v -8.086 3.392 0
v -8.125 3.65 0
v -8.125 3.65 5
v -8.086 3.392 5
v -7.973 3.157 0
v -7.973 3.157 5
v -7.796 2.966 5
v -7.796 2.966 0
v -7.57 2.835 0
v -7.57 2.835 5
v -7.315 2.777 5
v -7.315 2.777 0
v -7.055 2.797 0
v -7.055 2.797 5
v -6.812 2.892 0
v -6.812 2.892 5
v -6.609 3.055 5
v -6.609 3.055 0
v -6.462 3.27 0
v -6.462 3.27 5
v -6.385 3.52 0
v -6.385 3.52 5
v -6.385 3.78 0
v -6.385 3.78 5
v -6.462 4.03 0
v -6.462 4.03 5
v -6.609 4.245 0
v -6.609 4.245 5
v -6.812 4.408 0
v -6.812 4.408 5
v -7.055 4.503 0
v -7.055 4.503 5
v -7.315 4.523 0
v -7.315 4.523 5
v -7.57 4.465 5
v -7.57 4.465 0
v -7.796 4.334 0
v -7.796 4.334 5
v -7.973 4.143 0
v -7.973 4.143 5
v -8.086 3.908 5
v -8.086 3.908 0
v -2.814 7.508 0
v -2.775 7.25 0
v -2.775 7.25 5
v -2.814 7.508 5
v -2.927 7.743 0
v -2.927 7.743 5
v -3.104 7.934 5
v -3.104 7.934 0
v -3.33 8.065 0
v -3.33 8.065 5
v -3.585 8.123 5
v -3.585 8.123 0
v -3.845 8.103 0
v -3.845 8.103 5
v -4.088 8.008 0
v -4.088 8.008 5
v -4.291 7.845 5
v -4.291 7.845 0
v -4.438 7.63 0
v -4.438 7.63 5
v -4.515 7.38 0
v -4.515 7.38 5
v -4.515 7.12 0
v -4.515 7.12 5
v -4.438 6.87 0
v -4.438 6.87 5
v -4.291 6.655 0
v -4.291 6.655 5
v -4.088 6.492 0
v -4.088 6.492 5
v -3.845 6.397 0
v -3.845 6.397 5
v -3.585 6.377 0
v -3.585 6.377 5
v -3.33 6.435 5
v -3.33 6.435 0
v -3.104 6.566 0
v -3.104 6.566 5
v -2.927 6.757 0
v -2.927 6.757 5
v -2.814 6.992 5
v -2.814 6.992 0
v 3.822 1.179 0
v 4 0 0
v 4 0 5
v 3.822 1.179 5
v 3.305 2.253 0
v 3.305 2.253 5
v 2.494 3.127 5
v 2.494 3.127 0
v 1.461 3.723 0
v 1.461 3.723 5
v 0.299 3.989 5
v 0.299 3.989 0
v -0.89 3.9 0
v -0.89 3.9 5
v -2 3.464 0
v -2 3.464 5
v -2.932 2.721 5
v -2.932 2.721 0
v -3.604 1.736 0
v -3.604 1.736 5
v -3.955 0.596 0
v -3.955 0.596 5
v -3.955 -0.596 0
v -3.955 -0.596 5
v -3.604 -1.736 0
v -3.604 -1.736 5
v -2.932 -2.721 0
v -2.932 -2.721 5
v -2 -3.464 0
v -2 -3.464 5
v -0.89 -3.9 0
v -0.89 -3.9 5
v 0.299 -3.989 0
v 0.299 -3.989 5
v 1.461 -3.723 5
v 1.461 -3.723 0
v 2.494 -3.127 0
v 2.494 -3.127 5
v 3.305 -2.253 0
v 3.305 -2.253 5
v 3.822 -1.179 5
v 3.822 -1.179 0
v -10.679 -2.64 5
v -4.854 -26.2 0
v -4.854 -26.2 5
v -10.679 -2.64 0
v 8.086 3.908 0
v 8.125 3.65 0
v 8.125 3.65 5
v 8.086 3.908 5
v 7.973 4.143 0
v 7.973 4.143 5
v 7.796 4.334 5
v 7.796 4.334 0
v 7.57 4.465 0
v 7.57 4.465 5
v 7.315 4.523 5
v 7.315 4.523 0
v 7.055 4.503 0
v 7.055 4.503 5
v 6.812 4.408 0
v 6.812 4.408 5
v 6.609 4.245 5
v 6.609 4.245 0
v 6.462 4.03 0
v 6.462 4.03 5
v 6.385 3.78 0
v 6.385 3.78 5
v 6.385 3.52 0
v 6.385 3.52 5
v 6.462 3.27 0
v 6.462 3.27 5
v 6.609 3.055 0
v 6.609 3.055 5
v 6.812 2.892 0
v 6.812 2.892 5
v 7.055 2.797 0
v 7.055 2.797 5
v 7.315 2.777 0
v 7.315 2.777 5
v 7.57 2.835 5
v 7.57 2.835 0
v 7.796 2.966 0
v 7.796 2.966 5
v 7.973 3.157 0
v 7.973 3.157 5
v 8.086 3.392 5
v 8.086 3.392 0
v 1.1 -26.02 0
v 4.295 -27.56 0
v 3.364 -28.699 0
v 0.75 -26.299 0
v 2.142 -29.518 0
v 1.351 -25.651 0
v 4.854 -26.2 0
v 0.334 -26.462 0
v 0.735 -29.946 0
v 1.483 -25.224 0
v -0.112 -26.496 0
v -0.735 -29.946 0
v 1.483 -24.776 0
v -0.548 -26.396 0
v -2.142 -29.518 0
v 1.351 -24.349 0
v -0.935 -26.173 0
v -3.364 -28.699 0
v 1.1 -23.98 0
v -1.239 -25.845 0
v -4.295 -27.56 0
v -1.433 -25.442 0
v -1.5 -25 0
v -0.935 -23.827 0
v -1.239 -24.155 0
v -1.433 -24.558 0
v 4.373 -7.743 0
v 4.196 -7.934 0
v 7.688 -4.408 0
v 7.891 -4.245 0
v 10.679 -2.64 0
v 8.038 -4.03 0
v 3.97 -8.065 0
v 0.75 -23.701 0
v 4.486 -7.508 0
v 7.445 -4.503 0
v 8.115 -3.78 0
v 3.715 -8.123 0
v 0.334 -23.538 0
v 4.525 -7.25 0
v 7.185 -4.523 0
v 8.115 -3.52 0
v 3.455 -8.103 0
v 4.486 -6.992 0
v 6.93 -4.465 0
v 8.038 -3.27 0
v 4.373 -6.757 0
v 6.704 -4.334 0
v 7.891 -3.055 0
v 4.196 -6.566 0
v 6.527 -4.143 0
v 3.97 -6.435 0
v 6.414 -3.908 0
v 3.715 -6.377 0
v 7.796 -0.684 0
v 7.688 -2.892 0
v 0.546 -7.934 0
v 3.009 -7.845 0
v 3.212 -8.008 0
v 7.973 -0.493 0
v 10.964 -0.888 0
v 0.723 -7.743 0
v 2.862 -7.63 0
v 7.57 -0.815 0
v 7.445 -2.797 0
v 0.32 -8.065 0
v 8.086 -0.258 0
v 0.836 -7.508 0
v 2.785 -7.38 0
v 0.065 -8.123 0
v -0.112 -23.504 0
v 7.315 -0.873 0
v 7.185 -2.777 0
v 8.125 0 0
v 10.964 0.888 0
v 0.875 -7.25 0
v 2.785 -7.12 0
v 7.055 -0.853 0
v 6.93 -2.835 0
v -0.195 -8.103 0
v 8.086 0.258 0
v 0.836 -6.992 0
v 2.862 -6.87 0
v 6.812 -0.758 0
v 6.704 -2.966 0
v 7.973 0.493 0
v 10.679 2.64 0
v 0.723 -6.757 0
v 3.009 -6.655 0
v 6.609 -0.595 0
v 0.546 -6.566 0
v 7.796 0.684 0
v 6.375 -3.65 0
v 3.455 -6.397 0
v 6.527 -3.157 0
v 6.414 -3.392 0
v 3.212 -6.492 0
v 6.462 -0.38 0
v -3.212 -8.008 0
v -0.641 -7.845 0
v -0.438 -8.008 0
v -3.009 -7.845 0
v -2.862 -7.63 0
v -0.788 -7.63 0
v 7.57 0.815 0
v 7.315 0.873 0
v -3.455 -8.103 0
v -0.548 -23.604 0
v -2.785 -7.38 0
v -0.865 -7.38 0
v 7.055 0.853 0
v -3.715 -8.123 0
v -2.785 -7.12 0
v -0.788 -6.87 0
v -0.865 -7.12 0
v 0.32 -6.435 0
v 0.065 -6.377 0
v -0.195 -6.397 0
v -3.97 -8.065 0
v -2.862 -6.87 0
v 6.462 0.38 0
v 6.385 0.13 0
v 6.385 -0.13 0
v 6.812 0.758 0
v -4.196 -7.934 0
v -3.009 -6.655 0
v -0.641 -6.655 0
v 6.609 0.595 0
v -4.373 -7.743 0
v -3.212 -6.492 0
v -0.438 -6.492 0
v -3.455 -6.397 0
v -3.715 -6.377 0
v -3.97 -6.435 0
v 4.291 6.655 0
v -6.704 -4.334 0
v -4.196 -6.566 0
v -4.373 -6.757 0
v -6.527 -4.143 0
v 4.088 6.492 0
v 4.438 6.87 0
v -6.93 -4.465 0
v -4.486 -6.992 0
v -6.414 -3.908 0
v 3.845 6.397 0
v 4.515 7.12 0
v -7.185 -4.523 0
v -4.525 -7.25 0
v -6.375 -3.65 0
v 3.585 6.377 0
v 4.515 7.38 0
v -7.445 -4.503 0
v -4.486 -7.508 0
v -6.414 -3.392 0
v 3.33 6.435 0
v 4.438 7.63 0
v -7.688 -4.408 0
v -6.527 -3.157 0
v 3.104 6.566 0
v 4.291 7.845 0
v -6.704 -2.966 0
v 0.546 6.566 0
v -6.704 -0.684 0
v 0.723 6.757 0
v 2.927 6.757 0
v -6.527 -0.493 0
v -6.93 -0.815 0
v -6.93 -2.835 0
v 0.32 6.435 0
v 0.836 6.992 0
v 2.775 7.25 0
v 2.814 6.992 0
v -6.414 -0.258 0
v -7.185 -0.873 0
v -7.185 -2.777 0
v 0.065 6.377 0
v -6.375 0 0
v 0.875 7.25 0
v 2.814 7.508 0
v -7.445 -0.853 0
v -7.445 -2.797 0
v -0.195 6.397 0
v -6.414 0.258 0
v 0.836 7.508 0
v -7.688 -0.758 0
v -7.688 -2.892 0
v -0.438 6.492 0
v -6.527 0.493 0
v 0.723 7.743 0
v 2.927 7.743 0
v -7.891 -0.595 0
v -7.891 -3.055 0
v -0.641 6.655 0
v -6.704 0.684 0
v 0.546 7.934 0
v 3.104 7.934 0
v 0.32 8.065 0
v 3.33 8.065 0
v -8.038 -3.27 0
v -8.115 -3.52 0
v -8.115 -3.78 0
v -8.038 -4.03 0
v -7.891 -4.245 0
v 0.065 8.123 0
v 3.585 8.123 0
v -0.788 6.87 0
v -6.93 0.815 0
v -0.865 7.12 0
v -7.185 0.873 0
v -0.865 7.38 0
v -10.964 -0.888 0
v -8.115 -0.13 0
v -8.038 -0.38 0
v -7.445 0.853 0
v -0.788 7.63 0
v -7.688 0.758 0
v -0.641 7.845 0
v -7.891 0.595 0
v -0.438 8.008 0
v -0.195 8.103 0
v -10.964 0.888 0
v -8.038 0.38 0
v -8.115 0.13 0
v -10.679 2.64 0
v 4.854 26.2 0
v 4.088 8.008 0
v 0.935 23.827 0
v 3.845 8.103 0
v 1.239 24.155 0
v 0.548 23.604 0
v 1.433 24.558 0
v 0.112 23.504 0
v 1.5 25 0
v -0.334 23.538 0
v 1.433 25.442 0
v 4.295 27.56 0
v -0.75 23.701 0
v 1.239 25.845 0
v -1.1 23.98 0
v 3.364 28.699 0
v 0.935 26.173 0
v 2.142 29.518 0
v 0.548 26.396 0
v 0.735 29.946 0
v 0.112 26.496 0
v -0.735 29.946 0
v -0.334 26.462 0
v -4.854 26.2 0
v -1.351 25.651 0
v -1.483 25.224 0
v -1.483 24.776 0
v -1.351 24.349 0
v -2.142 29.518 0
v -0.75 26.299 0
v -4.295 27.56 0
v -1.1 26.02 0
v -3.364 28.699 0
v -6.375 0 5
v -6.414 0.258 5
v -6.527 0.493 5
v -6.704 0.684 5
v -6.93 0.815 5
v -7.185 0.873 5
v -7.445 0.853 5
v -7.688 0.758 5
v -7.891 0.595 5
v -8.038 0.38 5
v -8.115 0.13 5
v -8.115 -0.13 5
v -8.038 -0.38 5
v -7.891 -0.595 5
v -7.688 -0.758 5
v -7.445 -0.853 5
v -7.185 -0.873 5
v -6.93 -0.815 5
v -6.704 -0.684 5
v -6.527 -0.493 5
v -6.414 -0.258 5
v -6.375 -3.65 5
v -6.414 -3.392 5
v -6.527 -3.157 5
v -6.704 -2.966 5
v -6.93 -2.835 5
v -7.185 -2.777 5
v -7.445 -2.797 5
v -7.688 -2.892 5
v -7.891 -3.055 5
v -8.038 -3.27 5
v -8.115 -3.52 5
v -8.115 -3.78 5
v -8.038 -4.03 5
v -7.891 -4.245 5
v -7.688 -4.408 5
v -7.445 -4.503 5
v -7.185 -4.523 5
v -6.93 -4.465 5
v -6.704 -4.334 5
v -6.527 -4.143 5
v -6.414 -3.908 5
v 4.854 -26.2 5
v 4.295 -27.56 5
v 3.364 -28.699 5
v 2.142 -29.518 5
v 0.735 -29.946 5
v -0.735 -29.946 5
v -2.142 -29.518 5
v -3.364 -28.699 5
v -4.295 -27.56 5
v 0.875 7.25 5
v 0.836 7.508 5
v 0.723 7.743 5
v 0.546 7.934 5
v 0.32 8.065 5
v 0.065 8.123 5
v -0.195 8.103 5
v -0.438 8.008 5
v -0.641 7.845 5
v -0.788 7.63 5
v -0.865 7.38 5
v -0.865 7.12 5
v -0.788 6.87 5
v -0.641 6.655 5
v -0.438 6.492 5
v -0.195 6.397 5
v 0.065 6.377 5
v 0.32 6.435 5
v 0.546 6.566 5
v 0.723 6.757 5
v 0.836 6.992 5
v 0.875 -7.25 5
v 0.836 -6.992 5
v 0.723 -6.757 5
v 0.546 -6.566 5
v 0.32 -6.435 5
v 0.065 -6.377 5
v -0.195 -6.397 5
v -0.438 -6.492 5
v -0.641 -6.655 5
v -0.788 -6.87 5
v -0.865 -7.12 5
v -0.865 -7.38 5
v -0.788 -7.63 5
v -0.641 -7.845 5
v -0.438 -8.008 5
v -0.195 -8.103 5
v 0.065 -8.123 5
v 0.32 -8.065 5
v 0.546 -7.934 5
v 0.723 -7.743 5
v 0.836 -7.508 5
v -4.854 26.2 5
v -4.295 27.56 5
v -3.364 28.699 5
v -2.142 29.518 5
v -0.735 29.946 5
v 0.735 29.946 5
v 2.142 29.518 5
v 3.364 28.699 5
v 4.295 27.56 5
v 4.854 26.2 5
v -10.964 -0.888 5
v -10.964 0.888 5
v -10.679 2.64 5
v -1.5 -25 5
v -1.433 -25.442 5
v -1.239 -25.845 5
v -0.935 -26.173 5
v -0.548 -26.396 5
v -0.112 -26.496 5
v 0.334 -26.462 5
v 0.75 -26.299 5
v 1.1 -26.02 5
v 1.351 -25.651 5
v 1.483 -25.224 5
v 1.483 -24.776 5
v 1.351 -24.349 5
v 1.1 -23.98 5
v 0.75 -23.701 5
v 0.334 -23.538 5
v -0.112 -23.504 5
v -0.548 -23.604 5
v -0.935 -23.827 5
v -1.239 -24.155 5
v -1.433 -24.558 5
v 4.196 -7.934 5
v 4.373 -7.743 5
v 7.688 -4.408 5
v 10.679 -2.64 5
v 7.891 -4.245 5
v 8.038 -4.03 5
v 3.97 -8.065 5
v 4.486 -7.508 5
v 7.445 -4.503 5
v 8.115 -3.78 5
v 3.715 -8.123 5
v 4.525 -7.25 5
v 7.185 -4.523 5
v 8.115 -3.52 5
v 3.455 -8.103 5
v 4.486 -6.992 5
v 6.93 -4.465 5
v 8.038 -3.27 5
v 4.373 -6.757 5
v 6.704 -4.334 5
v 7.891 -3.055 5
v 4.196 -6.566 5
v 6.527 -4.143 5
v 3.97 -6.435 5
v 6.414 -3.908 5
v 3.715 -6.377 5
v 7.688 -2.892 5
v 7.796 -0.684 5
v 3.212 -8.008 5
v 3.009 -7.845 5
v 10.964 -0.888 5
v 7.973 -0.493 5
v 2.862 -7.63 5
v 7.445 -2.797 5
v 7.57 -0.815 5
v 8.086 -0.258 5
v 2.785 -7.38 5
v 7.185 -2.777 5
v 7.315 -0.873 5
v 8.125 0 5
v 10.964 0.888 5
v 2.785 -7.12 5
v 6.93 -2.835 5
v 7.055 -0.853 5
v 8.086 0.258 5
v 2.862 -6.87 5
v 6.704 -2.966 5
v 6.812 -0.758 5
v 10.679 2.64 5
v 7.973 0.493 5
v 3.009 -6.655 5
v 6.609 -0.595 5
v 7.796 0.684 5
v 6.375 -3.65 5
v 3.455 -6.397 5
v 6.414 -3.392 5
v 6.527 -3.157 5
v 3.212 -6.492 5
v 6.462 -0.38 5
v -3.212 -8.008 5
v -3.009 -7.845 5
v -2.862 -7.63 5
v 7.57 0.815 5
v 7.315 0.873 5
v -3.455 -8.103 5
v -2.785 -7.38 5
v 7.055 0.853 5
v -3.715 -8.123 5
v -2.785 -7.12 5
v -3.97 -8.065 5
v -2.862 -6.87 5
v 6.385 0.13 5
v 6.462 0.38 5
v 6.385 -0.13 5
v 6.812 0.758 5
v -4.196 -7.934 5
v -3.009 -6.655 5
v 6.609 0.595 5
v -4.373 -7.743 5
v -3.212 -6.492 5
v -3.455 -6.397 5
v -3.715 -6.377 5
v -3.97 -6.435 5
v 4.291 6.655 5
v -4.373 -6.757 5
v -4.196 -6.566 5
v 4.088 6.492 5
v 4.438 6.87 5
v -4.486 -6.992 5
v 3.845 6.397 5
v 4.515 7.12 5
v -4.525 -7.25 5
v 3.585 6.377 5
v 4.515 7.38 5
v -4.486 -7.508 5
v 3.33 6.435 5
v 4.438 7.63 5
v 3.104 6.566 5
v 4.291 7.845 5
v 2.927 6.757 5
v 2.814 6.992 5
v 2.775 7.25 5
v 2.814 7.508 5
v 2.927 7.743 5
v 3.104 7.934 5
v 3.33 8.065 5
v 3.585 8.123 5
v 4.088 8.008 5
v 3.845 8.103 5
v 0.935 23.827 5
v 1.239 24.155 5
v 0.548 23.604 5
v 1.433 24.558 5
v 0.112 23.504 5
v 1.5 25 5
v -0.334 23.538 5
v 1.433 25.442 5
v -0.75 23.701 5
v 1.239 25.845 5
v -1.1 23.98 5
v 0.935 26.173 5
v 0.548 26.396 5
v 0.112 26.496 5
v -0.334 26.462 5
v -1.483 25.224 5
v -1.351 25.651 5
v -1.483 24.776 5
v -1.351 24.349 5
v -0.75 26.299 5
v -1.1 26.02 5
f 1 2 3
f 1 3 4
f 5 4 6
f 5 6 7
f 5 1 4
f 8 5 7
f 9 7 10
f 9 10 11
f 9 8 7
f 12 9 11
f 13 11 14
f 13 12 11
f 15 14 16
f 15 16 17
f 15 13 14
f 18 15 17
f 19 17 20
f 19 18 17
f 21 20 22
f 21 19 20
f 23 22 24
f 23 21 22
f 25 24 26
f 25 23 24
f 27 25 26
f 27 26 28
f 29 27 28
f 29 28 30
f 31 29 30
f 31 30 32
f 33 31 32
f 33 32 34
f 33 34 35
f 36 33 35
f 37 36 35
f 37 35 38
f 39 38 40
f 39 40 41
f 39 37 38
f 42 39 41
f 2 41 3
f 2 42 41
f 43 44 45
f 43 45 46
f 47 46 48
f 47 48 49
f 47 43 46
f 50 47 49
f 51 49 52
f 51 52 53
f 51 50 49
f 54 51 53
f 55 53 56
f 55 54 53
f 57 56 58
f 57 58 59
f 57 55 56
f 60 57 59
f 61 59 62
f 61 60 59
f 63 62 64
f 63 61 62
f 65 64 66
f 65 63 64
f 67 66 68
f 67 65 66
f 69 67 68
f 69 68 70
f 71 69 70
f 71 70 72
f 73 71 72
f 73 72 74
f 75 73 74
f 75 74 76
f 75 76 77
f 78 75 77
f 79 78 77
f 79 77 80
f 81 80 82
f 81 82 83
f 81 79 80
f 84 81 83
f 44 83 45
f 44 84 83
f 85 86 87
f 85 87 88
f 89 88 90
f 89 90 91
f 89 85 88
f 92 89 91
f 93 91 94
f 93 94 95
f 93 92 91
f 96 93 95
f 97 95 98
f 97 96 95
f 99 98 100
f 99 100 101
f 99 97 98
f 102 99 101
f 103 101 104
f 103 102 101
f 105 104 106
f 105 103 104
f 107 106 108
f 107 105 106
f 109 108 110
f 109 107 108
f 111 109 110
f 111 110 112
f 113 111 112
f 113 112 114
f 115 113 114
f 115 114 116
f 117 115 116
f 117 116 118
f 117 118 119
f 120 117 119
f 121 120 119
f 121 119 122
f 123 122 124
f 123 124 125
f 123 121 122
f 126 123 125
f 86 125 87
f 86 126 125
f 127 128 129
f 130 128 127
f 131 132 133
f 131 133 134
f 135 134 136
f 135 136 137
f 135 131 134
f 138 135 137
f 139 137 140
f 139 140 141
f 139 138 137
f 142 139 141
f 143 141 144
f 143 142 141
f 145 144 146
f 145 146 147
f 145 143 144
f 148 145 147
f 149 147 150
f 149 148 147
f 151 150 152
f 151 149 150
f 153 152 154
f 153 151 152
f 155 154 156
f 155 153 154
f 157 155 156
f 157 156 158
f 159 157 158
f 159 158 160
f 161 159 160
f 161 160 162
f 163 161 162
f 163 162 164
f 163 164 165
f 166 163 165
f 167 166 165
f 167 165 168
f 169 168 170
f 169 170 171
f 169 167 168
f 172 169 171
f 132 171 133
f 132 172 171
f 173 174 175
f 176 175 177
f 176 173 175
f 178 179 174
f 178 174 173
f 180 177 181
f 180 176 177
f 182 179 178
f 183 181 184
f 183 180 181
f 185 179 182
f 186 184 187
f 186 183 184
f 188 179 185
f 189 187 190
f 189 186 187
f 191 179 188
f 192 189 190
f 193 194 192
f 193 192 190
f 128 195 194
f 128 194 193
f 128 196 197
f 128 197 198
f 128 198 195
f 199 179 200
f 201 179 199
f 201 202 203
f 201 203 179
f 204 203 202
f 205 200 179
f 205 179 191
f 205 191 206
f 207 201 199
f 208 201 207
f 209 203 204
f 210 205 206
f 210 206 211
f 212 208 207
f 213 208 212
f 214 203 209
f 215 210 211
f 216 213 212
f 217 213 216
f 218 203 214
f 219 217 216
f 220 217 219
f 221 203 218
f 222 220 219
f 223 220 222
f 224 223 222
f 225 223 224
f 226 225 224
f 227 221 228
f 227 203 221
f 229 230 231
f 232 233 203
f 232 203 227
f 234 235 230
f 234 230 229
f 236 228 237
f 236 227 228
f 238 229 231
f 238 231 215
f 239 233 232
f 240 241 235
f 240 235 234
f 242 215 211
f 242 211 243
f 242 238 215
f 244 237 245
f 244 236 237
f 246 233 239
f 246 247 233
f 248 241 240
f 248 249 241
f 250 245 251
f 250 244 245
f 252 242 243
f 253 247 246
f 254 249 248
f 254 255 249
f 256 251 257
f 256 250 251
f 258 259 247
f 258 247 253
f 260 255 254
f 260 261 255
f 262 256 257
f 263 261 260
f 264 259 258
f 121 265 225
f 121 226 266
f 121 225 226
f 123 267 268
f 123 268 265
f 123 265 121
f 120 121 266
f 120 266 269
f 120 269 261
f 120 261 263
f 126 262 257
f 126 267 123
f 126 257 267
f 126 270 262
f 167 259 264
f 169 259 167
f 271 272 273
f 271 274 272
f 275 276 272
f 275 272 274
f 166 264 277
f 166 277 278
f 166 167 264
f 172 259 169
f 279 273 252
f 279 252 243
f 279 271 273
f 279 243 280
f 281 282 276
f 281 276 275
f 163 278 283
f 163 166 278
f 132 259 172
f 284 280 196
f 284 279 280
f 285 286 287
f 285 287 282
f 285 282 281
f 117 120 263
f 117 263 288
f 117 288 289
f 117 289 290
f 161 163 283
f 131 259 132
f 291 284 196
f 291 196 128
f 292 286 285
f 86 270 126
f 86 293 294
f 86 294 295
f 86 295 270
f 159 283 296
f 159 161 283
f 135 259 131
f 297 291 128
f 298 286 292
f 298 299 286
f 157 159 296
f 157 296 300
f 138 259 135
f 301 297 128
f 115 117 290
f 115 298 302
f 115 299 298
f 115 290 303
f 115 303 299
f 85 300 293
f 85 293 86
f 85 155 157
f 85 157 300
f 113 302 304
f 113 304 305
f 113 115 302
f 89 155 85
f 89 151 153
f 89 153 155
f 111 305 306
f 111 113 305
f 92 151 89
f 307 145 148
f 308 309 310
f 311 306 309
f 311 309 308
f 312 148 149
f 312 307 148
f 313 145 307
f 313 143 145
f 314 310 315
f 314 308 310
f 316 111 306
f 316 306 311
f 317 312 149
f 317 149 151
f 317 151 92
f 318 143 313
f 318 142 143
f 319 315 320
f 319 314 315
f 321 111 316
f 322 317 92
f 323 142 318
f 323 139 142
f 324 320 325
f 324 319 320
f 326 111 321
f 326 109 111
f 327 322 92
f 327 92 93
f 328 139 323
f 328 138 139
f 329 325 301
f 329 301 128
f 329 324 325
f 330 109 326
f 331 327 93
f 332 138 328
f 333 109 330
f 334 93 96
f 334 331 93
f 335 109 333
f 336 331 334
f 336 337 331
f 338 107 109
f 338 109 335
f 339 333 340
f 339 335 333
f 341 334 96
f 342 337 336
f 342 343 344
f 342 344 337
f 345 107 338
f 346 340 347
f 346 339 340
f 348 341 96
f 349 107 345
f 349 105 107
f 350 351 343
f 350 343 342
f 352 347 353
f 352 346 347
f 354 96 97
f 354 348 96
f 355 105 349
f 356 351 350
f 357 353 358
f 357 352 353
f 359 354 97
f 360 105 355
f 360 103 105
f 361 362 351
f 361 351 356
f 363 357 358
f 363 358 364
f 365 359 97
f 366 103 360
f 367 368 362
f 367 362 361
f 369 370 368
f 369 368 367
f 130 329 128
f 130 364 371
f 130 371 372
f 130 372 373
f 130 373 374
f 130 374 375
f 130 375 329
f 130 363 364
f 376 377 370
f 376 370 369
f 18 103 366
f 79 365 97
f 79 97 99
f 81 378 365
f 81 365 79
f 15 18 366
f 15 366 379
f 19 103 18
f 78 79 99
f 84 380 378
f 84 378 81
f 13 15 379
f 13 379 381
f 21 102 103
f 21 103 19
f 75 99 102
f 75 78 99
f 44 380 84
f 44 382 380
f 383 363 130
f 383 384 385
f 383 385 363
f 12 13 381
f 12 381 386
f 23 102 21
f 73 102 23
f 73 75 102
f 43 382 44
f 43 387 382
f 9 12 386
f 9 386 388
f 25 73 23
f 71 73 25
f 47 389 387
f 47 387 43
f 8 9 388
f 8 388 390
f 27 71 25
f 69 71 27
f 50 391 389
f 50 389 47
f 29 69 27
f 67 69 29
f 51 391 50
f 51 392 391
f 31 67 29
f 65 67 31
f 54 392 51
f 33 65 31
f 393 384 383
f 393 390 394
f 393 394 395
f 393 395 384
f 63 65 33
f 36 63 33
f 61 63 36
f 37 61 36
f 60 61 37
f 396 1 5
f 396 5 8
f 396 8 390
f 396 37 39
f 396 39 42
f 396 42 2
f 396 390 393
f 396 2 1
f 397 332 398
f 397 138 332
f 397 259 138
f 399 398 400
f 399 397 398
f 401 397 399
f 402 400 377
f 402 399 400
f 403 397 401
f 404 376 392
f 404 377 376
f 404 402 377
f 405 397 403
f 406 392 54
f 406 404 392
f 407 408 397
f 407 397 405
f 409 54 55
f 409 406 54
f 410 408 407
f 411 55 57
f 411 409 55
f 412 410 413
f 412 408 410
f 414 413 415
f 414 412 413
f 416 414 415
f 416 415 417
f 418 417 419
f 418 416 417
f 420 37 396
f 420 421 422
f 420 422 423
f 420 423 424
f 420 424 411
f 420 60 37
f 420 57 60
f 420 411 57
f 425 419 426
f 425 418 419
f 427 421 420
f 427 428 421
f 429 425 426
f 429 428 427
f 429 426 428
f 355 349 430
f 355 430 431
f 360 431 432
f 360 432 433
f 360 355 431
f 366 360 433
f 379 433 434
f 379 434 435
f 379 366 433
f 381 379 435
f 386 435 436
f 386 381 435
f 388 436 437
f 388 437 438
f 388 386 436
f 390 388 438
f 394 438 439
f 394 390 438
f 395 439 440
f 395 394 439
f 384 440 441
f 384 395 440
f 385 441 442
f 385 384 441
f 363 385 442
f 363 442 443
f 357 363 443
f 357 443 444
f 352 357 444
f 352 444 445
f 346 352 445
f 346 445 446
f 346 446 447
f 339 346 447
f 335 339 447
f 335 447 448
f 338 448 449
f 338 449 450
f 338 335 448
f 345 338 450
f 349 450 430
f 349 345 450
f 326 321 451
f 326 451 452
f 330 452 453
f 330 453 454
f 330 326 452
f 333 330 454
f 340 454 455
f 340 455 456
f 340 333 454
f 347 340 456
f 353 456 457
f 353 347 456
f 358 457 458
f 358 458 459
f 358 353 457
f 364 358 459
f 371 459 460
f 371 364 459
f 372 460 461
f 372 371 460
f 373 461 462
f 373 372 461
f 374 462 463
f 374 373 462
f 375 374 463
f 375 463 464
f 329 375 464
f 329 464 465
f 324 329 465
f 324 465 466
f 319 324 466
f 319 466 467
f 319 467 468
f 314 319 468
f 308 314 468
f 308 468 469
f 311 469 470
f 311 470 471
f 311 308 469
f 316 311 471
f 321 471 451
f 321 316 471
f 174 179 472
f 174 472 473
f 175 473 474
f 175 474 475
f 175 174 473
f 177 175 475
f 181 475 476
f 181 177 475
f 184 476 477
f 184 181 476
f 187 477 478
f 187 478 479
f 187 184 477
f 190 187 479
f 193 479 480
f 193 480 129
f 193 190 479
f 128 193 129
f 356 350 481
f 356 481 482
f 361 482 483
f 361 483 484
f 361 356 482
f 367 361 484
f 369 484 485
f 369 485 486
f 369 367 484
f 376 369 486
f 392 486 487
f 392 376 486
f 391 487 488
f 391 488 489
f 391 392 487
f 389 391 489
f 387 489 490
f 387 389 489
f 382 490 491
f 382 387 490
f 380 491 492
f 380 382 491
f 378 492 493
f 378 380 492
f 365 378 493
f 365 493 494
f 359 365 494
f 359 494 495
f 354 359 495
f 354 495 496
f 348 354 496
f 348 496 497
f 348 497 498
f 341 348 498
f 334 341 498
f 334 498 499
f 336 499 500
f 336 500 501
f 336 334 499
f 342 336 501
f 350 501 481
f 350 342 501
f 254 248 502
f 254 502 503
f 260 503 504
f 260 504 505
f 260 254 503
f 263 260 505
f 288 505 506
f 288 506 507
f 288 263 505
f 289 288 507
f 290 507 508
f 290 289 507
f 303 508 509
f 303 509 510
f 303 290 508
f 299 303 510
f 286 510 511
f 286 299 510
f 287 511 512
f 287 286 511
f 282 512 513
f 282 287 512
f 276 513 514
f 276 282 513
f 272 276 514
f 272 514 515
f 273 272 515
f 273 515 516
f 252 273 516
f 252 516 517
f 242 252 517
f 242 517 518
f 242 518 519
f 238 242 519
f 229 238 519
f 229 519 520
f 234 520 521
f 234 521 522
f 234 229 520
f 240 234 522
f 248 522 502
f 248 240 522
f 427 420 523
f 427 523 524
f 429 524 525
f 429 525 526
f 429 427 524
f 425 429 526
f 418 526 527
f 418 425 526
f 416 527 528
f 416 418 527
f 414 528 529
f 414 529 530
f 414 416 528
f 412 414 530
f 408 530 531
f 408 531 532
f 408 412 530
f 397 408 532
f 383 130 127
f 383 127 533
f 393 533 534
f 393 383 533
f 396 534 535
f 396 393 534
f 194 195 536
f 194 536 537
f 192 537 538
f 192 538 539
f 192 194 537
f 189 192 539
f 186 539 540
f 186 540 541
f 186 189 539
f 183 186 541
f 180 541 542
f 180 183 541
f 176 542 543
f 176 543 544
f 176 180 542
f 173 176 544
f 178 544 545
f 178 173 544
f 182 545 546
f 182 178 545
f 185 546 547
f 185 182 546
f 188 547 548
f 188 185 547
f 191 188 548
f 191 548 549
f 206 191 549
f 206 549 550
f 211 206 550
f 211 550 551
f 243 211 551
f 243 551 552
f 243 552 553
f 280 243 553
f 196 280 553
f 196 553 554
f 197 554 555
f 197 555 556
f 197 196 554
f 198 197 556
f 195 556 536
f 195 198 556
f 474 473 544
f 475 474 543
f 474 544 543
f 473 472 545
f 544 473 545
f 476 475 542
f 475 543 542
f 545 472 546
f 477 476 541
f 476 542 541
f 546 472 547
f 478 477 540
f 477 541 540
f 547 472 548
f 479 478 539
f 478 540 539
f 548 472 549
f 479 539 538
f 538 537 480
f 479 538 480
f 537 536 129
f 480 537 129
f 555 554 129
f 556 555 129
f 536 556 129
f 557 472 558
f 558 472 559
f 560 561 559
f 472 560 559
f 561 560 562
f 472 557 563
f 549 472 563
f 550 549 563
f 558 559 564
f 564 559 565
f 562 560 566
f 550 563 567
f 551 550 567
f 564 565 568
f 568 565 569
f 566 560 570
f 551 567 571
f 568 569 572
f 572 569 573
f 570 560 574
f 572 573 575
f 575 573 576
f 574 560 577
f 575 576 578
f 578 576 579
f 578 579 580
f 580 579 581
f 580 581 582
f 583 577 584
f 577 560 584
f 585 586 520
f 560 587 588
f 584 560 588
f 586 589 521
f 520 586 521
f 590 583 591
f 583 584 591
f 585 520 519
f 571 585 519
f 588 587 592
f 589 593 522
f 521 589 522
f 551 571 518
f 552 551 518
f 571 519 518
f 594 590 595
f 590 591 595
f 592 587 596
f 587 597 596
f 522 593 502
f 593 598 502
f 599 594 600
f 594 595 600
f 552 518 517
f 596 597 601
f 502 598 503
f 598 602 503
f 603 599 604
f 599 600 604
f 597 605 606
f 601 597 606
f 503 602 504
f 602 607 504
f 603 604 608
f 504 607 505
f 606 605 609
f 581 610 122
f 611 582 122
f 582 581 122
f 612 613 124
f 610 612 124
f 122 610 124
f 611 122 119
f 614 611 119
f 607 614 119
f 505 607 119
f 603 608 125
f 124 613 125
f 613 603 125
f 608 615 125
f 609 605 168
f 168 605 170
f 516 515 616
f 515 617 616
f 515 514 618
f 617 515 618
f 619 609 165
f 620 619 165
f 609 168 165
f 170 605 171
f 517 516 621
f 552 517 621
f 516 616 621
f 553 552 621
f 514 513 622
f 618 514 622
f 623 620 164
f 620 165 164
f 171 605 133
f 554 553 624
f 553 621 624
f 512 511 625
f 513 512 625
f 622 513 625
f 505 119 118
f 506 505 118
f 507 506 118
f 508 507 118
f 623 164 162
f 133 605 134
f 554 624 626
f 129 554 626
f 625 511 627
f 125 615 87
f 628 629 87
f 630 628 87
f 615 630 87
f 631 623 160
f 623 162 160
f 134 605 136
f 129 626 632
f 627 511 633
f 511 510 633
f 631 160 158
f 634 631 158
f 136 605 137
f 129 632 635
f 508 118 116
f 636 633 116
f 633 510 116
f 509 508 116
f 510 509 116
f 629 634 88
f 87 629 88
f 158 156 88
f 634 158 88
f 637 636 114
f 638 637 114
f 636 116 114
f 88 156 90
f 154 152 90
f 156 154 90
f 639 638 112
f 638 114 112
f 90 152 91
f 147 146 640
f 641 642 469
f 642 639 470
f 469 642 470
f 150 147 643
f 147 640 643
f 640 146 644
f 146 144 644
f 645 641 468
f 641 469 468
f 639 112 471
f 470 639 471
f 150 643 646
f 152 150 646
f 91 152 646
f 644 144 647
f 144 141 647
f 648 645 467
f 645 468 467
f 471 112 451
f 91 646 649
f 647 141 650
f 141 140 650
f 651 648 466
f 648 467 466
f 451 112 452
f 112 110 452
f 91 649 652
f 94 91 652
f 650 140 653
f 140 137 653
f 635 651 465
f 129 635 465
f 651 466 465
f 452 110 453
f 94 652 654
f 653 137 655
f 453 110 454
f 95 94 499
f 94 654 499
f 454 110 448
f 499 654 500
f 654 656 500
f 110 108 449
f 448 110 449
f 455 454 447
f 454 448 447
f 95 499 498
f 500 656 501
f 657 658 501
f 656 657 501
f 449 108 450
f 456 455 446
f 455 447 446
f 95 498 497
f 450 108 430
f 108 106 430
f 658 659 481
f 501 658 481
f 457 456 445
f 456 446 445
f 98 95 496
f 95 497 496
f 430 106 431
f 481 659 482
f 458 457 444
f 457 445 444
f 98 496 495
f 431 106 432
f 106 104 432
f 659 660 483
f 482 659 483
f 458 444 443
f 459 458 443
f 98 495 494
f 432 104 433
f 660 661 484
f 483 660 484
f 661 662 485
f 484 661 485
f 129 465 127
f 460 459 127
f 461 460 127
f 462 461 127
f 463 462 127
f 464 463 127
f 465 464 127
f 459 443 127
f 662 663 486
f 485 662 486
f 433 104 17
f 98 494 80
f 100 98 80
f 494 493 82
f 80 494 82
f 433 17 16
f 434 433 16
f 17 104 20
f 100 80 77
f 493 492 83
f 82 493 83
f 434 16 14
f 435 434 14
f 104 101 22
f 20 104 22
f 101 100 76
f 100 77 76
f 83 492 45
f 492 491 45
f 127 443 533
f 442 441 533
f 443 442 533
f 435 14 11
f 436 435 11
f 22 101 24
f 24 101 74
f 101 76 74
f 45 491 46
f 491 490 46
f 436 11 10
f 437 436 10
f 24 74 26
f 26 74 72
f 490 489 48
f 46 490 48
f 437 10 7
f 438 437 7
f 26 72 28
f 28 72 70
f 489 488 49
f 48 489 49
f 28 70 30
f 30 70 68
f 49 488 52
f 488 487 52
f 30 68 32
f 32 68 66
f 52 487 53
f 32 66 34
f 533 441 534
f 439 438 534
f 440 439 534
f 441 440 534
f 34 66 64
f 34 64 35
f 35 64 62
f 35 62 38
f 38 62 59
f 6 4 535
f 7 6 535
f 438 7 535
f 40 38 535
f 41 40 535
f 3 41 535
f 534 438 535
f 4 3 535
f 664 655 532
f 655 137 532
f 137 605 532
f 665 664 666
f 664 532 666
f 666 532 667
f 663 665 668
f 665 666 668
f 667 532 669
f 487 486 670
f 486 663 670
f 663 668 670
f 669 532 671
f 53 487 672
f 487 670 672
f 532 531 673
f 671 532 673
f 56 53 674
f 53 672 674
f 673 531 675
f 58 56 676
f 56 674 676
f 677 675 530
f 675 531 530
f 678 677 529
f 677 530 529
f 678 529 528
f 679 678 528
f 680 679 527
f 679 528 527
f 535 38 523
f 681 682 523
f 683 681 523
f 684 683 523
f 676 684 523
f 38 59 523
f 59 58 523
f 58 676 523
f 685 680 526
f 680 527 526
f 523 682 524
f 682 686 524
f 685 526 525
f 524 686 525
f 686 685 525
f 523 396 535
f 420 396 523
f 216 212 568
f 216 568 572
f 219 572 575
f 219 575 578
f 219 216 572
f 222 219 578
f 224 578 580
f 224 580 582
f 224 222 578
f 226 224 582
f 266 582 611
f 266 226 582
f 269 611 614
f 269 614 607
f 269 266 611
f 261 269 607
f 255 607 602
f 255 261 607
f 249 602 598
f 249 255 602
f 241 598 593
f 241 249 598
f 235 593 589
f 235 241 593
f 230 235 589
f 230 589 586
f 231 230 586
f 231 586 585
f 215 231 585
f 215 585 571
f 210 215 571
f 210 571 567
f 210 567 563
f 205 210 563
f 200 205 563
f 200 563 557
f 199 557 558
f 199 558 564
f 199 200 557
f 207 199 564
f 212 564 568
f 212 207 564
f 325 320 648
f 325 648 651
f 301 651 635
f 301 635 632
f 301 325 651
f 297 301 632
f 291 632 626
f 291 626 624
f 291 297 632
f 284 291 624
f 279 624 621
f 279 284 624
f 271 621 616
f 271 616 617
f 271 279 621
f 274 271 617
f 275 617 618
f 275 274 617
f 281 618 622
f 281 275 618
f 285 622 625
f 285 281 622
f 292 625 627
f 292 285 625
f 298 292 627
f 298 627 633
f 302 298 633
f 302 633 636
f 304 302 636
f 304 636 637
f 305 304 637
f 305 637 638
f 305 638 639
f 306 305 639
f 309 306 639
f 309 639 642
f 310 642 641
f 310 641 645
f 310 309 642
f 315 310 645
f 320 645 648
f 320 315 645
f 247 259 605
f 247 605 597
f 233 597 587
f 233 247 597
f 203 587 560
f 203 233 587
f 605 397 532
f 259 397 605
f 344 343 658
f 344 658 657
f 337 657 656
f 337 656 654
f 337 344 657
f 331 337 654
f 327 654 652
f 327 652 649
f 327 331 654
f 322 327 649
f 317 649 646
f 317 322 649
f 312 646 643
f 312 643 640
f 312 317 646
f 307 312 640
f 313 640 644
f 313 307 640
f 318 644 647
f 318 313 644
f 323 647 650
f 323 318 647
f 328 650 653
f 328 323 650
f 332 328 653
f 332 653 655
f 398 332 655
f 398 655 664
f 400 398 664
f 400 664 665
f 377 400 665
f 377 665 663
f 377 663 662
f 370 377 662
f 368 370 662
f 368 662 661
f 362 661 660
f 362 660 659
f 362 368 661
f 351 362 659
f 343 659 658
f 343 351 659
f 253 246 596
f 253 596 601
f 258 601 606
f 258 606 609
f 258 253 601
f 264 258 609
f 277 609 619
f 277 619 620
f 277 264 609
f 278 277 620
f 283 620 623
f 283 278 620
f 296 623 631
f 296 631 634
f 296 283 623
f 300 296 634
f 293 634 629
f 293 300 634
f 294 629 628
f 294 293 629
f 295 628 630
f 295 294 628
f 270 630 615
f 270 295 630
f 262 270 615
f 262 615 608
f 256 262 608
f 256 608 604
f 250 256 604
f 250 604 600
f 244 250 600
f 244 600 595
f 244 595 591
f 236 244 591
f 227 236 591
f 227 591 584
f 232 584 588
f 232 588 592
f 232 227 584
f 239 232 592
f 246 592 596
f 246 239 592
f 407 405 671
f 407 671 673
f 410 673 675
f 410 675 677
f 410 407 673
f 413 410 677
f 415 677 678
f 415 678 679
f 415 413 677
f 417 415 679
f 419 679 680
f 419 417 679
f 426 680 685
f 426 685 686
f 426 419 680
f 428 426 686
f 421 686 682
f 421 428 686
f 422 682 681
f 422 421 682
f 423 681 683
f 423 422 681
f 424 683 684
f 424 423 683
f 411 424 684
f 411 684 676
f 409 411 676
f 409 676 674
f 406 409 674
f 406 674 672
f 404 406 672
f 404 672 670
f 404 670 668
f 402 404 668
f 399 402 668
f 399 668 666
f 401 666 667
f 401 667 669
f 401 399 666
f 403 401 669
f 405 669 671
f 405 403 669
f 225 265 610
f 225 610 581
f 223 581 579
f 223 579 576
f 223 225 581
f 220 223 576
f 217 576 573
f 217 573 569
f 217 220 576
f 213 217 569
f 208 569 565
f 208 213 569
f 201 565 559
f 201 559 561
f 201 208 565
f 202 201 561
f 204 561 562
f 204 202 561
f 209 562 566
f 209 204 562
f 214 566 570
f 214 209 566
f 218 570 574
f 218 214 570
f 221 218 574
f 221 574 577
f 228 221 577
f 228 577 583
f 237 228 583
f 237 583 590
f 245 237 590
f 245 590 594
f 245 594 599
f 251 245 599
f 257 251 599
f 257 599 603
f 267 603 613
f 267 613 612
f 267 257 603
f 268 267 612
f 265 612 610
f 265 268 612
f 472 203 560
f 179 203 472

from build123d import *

# Parameters (mm, degrees)
ESQUISSE1_R        = 4
ESQUISSE1_R_2      = 0.875
ESQUISSE1_R_3      = 1.5
BOSS_EXTRU_1_DEPTH = 5


with BuildPart() as part:
    # Esquisse1 → Boss.-Extru.1 (new body)
    with BuildSketch(Plane.XY):
        with BuildLine():
            Line((-10.678501768, 2.64), (-4.85386444, 26.2))
            ThreePointArc((-4.85386444, 26.2), (0, 30), (4.85386444, 26.2))
            Line((4.85386444, 26.2), (10.678501768, 2.64))
            ThreePointArc((10.678501768, 2.64), (11, 0), (10.678501768, -2.64))
            Line((10.678501768, -2.64), (4.85386444, -26.2))
            ThreePointArc((4.85386444, -26.2), (0, -30), (-4.85386444, -26.2))
            Line((-4.85386444, -26.2), (-10.678501768, -2.64))
            ThreePointArc((-10.678501768, -2.64), (-11, 0), (-10.678501768, 2.64))
        make_face()
        Circle(ESQUISSE1_R, mode=Mode.SUBTRACT)
        with Locations((7.25, 0)):
            Circle(ESQUISSE1_R_2, mode=Mode.SUBTRACT)
        with Locations((7.25, 3.65)):
            Circle(ESQUISSE1_R_2, mode=Mode.SUBTRACT)
        with Locations(Location((7.25, -3.65, 0), (0, 0, 180))):
            Circle(ESQUISSE1_R_2, mode=Mode.SUBTRACT)
        with Locations((3.65, -7.25)):
            Circle(ESQUISSE1_R_2, mode=Mode.SUBTRACT)
        with Locations((0, -7.25)):
            Circle(ESQUISSE1_R_2, mode=Mode.SUBTRACT)
        with Locations(Location((-3.65, -7.25, 0), (0, 0, 180))):
            Circle(ESQUISSE1_R_2, mode=Mode.SUBTRACT)
        with Locations((-7.25, -3.65)):
            Circle(ESQUISSE1_R_2, mode=Mode.SUBTRACT)
        with Locations((-7.25, 0)):
            Circle(ESQUISSE1_R_2, mode=Mode.SUBTRACT)
        with Locations(Location((-7.25, 3.65, 0), (0, 0, 180))):
            Circle(ESQUISSE1_R_2, mode=Mode.SUBTRACT)
        with Locations((-3.65, 7.25)):
            Circle(ESQUISSE1_R_2, mode=Mode.SUBTRACT)
        with Locations((0, 7.25)):
            Circle(ESQUISSE1_R_2, mode=Mode.SUBTRACT)
        with Locations(Location((3.65, 7.25, 0), (0, 0, 180))):
            Circle(ESQUISSE1_R_2, mode=Mode.SUBTRACT)
        with Locations((0, 25)):
            Circle(ESQUISSE1_R_3, mode=Mode.SUBTRACT)
        with Locations(Location((0, -25, 0), (0, 0, 180))):
            Circle(ESQUISSE1_R_3, mode=Mode.SUBTRACT)
    extrude(amount=BOSS_EXTRU_1_DEPTH)


solid = part.part
